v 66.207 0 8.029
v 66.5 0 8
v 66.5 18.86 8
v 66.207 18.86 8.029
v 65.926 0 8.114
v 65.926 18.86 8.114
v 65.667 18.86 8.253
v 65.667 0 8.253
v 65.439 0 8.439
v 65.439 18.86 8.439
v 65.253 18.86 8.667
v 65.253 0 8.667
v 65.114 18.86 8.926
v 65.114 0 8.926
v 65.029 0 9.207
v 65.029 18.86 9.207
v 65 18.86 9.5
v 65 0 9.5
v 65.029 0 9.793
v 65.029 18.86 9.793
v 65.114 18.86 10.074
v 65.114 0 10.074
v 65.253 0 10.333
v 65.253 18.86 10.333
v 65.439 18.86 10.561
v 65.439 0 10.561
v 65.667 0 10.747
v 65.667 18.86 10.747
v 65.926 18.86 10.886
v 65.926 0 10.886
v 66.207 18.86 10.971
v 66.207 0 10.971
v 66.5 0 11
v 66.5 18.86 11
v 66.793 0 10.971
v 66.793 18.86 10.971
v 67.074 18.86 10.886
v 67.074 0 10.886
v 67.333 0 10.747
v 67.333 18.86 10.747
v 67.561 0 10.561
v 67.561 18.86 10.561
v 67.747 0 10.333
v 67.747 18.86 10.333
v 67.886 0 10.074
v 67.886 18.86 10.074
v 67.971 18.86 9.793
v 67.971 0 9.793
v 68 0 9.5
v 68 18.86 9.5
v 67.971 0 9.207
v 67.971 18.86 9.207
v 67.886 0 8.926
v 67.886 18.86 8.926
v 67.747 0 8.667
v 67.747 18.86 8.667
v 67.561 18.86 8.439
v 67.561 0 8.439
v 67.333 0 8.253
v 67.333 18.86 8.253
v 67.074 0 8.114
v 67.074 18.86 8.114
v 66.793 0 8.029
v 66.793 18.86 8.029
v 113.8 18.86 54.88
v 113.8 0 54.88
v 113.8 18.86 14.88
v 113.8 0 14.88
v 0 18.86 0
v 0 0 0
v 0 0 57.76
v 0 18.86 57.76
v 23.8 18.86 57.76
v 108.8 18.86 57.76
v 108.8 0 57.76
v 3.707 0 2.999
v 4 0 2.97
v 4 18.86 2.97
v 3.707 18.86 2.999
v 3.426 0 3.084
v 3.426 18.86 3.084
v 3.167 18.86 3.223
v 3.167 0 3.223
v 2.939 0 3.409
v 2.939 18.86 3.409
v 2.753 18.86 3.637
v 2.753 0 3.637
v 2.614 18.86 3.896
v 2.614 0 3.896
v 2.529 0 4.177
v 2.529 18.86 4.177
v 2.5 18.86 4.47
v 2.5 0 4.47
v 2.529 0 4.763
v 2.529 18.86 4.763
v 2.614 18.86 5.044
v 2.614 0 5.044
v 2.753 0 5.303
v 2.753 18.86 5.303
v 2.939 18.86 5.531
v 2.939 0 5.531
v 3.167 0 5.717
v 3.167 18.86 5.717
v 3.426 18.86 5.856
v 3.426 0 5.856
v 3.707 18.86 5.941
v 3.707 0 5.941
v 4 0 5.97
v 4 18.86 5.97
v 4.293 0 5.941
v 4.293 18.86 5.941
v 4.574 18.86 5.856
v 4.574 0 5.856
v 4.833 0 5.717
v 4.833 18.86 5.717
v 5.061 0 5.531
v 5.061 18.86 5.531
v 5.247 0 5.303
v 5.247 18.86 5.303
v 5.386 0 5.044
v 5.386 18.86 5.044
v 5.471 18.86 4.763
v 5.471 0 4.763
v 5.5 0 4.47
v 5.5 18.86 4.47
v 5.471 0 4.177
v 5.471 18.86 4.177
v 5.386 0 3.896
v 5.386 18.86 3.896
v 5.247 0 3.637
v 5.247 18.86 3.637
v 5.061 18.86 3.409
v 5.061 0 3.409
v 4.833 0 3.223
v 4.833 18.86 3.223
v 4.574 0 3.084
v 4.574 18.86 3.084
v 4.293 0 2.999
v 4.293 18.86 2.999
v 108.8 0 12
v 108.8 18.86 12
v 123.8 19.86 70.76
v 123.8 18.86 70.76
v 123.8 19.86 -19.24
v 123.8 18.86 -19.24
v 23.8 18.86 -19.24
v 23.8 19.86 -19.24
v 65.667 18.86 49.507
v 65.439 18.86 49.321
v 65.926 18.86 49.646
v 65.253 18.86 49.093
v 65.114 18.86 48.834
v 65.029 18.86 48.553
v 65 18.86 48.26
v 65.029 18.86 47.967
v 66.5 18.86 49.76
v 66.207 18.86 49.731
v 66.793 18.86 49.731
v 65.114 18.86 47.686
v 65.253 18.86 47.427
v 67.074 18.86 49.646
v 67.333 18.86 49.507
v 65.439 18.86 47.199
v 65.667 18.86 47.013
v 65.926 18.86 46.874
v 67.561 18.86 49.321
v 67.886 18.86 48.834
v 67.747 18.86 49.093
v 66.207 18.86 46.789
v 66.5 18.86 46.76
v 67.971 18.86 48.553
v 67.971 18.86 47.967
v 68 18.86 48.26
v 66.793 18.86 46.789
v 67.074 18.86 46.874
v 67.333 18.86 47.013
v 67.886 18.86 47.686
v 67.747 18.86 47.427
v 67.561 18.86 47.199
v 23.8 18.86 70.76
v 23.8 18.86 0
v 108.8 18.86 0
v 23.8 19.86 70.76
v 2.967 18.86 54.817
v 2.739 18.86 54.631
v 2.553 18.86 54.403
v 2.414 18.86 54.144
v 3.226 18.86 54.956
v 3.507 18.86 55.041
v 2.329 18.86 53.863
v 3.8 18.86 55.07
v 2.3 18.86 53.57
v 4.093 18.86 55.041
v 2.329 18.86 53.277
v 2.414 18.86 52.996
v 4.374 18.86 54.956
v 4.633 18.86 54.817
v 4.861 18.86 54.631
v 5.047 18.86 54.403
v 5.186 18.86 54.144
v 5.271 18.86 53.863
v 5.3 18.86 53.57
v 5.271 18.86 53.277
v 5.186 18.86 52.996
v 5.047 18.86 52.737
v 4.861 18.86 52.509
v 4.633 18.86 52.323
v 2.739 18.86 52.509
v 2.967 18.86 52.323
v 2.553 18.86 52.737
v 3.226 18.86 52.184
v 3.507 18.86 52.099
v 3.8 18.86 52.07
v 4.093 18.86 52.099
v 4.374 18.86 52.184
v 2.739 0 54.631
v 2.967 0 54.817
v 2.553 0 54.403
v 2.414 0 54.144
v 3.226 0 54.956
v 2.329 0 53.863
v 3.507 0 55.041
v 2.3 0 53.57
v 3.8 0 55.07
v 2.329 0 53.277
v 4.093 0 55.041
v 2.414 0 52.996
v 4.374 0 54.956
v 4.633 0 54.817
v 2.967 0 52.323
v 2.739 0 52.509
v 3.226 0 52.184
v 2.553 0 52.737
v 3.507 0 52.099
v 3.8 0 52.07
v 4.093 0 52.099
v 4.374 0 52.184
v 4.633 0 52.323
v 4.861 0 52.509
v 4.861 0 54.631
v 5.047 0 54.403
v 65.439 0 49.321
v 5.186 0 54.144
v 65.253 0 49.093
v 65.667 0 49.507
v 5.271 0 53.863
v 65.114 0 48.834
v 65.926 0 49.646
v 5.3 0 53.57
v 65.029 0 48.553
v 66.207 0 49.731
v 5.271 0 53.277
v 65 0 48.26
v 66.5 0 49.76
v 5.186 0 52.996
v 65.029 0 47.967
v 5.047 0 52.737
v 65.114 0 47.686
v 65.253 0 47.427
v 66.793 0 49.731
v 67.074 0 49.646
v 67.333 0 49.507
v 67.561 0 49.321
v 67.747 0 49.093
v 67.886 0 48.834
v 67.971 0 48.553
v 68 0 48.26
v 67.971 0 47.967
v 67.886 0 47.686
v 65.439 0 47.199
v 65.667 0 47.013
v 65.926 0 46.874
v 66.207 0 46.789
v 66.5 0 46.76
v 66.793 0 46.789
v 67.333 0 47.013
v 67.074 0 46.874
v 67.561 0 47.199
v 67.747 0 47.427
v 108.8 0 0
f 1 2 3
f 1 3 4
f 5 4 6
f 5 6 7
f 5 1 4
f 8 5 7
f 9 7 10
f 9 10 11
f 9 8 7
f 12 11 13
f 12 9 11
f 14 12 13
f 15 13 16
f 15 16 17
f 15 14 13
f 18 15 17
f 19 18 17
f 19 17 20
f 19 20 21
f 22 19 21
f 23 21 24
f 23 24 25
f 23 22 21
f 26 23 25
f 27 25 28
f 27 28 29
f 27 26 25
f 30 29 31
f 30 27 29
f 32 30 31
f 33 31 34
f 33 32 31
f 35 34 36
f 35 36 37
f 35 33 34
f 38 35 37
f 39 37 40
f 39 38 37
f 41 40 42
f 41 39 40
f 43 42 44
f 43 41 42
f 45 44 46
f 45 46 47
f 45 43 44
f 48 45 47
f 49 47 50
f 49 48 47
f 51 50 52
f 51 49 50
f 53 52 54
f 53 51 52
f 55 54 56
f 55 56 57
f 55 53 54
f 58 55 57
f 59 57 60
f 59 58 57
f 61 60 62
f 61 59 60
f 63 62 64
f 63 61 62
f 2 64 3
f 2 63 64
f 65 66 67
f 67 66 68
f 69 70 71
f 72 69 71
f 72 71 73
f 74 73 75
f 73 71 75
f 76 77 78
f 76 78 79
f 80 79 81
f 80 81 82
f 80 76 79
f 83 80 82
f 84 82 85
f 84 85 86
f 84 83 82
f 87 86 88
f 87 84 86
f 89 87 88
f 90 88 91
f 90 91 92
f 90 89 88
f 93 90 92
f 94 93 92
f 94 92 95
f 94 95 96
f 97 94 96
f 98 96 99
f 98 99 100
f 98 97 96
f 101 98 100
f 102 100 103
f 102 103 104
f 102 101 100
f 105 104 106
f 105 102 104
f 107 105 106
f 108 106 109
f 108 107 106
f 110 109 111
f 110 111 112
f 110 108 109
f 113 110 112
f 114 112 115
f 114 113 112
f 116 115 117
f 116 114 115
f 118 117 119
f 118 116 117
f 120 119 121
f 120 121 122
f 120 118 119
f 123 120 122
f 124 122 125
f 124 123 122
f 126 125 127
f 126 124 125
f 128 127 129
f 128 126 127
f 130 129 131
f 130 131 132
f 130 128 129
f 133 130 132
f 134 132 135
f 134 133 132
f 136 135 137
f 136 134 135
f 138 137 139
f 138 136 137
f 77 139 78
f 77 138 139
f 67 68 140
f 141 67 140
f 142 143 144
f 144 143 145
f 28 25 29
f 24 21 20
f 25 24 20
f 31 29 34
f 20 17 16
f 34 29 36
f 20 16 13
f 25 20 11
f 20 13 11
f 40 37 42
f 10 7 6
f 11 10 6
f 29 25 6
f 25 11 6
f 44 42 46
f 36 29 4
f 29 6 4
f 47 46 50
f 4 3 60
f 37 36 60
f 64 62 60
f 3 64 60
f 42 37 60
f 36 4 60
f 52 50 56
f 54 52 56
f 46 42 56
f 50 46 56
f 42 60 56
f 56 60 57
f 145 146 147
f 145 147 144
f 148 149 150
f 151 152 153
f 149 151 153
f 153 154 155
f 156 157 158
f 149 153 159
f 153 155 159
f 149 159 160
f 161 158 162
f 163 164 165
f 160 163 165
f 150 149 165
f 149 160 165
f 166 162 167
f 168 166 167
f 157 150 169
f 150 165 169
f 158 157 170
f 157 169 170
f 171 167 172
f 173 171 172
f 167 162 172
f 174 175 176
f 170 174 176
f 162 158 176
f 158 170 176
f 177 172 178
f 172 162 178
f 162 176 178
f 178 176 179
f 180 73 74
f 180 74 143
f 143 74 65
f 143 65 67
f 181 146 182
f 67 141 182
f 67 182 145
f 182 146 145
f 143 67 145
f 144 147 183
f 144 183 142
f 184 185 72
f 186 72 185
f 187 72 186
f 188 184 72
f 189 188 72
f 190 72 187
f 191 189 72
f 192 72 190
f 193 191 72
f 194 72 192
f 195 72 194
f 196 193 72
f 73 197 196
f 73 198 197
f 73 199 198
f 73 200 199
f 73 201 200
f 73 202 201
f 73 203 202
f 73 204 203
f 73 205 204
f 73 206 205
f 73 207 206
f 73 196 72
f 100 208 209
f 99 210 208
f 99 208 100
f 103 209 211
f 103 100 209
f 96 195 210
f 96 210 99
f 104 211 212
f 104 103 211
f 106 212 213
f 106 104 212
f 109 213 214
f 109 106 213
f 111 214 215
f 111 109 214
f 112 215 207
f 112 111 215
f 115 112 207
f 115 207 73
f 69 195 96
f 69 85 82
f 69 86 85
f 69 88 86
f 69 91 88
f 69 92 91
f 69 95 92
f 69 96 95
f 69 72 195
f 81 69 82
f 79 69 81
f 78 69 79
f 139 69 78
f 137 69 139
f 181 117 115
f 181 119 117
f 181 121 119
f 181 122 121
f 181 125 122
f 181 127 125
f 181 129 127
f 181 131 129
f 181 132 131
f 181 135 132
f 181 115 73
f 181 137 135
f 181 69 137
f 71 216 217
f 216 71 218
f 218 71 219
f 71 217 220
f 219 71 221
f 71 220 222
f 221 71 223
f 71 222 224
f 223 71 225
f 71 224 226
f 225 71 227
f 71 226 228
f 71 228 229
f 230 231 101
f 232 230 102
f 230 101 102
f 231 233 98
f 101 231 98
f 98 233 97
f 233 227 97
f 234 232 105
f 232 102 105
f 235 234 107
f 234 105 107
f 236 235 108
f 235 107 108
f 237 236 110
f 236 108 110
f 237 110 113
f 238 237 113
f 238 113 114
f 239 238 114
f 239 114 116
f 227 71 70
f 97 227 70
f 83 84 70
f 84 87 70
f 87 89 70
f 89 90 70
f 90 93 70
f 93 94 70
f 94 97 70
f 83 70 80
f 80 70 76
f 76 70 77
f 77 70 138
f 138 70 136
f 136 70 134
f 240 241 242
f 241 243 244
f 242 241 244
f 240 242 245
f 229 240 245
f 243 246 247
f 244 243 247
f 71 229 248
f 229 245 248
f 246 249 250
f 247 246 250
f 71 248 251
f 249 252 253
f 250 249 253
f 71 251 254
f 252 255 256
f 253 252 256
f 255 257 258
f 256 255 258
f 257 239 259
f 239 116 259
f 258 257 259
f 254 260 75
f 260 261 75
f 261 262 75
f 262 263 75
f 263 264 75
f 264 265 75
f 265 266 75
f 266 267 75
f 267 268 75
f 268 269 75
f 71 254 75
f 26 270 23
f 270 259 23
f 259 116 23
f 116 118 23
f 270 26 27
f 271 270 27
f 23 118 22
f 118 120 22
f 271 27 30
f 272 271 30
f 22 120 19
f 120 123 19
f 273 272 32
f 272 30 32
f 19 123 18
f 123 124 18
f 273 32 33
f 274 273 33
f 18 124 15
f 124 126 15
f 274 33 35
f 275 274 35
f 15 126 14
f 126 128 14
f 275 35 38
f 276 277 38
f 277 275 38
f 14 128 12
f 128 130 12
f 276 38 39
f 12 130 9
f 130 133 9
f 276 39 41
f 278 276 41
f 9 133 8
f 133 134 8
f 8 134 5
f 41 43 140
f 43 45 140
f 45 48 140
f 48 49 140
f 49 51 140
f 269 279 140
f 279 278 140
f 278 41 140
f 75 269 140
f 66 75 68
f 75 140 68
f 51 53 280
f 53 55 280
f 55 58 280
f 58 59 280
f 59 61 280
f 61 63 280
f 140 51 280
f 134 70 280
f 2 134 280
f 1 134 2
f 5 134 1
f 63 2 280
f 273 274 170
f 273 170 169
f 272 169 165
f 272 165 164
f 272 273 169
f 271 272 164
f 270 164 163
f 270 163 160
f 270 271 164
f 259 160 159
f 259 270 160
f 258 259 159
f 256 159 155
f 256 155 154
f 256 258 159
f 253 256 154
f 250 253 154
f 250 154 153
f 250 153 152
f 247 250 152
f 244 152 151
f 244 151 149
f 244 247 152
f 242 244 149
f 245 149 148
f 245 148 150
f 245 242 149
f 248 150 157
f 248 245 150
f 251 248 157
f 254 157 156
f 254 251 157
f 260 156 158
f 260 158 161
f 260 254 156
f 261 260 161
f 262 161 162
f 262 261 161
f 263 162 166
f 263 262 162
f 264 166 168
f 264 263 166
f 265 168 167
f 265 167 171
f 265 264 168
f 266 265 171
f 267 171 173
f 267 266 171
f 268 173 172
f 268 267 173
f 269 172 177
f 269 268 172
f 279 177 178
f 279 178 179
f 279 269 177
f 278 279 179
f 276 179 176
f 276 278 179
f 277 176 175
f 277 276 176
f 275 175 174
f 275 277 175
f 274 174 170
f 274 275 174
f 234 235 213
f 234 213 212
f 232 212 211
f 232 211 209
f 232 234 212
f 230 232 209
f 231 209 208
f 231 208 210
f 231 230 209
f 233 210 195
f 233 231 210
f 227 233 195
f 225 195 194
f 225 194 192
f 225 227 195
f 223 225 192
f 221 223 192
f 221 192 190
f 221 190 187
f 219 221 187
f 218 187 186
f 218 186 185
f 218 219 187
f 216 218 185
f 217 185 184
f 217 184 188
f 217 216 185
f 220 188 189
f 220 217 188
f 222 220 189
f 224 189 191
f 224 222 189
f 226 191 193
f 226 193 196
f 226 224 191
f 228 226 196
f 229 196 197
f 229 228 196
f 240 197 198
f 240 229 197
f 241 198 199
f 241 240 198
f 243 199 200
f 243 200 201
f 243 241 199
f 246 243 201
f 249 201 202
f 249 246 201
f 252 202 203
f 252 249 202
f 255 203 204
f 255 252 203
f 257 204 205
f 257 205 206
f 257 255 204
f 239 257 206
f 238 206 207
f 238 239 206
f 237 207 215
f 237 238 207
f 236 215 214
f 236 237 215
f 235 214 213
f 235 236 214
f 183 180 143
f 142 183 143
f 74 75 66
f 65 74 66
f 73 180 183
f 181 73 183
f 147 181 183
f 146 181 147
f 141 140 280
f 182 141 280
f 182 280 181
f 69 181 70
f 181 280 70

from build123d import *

# Parameters (mm, degrees)
SKETCH1_R           = 1.5
BOSS_EXTRUDE1_DEPTH = 18.86
SKETCH2_W           = 100
SKETCH2_H           = 90
BOSS_EXTRUDE2_DEPTH = 1


with BuildPart() as part:
    # Sketch1 → Boss-Extrude1 (new body)
    with BuildSketch(Plane(origin=(0, 0, 0), x_dir=(1, 0, 0), z_dir=(0, 1, 0))):
        Polygon((0, 0), (0, -57.76), (108.8, -57.76), (113.8, -54.88), (113.8, -14.88), (108.8, -12), (108.8, 0), align=None)
        with Locations(Location((66.5, -9.5, 0), (0, 0, 90))):
            Circle(SKETCH1_R, mode=Mode.SUBTRACT)
        with Locations(Location((4, -4.47, 0), (0, 0, 90))):
            Circle(SKETCH1_R, mode=Mode.SUBTRACT)
        with Locations(Location((3.8, -53.57, 0), (0, 0, 90))):
            Circle(SKETCH1_R, mode=Mode.SUBTRACT)
        with Locations(Location((66.5, -48.26, 0), (0, 0, 90))):
            Circle(SKETCH1_R, mode=Mode.SUBTRACT)
    extrude(amount=BOSS_EXTRUDE1_DEPTH)

    # Sketch2 → Boss-Extrude2 (add)
    with BuildSketch(Plane(origin=(0, 18.86, 0), x_dir=(1, 0, 0), z_dir=(0, 1, 0))):
        with Locations((73.8, -25.76)):
            Rectangle(SKETCH2_W, SKETCH2_H)
    extrude(amount=BOSS_EXTRUDE2_DEPTH)


solid = part.part
